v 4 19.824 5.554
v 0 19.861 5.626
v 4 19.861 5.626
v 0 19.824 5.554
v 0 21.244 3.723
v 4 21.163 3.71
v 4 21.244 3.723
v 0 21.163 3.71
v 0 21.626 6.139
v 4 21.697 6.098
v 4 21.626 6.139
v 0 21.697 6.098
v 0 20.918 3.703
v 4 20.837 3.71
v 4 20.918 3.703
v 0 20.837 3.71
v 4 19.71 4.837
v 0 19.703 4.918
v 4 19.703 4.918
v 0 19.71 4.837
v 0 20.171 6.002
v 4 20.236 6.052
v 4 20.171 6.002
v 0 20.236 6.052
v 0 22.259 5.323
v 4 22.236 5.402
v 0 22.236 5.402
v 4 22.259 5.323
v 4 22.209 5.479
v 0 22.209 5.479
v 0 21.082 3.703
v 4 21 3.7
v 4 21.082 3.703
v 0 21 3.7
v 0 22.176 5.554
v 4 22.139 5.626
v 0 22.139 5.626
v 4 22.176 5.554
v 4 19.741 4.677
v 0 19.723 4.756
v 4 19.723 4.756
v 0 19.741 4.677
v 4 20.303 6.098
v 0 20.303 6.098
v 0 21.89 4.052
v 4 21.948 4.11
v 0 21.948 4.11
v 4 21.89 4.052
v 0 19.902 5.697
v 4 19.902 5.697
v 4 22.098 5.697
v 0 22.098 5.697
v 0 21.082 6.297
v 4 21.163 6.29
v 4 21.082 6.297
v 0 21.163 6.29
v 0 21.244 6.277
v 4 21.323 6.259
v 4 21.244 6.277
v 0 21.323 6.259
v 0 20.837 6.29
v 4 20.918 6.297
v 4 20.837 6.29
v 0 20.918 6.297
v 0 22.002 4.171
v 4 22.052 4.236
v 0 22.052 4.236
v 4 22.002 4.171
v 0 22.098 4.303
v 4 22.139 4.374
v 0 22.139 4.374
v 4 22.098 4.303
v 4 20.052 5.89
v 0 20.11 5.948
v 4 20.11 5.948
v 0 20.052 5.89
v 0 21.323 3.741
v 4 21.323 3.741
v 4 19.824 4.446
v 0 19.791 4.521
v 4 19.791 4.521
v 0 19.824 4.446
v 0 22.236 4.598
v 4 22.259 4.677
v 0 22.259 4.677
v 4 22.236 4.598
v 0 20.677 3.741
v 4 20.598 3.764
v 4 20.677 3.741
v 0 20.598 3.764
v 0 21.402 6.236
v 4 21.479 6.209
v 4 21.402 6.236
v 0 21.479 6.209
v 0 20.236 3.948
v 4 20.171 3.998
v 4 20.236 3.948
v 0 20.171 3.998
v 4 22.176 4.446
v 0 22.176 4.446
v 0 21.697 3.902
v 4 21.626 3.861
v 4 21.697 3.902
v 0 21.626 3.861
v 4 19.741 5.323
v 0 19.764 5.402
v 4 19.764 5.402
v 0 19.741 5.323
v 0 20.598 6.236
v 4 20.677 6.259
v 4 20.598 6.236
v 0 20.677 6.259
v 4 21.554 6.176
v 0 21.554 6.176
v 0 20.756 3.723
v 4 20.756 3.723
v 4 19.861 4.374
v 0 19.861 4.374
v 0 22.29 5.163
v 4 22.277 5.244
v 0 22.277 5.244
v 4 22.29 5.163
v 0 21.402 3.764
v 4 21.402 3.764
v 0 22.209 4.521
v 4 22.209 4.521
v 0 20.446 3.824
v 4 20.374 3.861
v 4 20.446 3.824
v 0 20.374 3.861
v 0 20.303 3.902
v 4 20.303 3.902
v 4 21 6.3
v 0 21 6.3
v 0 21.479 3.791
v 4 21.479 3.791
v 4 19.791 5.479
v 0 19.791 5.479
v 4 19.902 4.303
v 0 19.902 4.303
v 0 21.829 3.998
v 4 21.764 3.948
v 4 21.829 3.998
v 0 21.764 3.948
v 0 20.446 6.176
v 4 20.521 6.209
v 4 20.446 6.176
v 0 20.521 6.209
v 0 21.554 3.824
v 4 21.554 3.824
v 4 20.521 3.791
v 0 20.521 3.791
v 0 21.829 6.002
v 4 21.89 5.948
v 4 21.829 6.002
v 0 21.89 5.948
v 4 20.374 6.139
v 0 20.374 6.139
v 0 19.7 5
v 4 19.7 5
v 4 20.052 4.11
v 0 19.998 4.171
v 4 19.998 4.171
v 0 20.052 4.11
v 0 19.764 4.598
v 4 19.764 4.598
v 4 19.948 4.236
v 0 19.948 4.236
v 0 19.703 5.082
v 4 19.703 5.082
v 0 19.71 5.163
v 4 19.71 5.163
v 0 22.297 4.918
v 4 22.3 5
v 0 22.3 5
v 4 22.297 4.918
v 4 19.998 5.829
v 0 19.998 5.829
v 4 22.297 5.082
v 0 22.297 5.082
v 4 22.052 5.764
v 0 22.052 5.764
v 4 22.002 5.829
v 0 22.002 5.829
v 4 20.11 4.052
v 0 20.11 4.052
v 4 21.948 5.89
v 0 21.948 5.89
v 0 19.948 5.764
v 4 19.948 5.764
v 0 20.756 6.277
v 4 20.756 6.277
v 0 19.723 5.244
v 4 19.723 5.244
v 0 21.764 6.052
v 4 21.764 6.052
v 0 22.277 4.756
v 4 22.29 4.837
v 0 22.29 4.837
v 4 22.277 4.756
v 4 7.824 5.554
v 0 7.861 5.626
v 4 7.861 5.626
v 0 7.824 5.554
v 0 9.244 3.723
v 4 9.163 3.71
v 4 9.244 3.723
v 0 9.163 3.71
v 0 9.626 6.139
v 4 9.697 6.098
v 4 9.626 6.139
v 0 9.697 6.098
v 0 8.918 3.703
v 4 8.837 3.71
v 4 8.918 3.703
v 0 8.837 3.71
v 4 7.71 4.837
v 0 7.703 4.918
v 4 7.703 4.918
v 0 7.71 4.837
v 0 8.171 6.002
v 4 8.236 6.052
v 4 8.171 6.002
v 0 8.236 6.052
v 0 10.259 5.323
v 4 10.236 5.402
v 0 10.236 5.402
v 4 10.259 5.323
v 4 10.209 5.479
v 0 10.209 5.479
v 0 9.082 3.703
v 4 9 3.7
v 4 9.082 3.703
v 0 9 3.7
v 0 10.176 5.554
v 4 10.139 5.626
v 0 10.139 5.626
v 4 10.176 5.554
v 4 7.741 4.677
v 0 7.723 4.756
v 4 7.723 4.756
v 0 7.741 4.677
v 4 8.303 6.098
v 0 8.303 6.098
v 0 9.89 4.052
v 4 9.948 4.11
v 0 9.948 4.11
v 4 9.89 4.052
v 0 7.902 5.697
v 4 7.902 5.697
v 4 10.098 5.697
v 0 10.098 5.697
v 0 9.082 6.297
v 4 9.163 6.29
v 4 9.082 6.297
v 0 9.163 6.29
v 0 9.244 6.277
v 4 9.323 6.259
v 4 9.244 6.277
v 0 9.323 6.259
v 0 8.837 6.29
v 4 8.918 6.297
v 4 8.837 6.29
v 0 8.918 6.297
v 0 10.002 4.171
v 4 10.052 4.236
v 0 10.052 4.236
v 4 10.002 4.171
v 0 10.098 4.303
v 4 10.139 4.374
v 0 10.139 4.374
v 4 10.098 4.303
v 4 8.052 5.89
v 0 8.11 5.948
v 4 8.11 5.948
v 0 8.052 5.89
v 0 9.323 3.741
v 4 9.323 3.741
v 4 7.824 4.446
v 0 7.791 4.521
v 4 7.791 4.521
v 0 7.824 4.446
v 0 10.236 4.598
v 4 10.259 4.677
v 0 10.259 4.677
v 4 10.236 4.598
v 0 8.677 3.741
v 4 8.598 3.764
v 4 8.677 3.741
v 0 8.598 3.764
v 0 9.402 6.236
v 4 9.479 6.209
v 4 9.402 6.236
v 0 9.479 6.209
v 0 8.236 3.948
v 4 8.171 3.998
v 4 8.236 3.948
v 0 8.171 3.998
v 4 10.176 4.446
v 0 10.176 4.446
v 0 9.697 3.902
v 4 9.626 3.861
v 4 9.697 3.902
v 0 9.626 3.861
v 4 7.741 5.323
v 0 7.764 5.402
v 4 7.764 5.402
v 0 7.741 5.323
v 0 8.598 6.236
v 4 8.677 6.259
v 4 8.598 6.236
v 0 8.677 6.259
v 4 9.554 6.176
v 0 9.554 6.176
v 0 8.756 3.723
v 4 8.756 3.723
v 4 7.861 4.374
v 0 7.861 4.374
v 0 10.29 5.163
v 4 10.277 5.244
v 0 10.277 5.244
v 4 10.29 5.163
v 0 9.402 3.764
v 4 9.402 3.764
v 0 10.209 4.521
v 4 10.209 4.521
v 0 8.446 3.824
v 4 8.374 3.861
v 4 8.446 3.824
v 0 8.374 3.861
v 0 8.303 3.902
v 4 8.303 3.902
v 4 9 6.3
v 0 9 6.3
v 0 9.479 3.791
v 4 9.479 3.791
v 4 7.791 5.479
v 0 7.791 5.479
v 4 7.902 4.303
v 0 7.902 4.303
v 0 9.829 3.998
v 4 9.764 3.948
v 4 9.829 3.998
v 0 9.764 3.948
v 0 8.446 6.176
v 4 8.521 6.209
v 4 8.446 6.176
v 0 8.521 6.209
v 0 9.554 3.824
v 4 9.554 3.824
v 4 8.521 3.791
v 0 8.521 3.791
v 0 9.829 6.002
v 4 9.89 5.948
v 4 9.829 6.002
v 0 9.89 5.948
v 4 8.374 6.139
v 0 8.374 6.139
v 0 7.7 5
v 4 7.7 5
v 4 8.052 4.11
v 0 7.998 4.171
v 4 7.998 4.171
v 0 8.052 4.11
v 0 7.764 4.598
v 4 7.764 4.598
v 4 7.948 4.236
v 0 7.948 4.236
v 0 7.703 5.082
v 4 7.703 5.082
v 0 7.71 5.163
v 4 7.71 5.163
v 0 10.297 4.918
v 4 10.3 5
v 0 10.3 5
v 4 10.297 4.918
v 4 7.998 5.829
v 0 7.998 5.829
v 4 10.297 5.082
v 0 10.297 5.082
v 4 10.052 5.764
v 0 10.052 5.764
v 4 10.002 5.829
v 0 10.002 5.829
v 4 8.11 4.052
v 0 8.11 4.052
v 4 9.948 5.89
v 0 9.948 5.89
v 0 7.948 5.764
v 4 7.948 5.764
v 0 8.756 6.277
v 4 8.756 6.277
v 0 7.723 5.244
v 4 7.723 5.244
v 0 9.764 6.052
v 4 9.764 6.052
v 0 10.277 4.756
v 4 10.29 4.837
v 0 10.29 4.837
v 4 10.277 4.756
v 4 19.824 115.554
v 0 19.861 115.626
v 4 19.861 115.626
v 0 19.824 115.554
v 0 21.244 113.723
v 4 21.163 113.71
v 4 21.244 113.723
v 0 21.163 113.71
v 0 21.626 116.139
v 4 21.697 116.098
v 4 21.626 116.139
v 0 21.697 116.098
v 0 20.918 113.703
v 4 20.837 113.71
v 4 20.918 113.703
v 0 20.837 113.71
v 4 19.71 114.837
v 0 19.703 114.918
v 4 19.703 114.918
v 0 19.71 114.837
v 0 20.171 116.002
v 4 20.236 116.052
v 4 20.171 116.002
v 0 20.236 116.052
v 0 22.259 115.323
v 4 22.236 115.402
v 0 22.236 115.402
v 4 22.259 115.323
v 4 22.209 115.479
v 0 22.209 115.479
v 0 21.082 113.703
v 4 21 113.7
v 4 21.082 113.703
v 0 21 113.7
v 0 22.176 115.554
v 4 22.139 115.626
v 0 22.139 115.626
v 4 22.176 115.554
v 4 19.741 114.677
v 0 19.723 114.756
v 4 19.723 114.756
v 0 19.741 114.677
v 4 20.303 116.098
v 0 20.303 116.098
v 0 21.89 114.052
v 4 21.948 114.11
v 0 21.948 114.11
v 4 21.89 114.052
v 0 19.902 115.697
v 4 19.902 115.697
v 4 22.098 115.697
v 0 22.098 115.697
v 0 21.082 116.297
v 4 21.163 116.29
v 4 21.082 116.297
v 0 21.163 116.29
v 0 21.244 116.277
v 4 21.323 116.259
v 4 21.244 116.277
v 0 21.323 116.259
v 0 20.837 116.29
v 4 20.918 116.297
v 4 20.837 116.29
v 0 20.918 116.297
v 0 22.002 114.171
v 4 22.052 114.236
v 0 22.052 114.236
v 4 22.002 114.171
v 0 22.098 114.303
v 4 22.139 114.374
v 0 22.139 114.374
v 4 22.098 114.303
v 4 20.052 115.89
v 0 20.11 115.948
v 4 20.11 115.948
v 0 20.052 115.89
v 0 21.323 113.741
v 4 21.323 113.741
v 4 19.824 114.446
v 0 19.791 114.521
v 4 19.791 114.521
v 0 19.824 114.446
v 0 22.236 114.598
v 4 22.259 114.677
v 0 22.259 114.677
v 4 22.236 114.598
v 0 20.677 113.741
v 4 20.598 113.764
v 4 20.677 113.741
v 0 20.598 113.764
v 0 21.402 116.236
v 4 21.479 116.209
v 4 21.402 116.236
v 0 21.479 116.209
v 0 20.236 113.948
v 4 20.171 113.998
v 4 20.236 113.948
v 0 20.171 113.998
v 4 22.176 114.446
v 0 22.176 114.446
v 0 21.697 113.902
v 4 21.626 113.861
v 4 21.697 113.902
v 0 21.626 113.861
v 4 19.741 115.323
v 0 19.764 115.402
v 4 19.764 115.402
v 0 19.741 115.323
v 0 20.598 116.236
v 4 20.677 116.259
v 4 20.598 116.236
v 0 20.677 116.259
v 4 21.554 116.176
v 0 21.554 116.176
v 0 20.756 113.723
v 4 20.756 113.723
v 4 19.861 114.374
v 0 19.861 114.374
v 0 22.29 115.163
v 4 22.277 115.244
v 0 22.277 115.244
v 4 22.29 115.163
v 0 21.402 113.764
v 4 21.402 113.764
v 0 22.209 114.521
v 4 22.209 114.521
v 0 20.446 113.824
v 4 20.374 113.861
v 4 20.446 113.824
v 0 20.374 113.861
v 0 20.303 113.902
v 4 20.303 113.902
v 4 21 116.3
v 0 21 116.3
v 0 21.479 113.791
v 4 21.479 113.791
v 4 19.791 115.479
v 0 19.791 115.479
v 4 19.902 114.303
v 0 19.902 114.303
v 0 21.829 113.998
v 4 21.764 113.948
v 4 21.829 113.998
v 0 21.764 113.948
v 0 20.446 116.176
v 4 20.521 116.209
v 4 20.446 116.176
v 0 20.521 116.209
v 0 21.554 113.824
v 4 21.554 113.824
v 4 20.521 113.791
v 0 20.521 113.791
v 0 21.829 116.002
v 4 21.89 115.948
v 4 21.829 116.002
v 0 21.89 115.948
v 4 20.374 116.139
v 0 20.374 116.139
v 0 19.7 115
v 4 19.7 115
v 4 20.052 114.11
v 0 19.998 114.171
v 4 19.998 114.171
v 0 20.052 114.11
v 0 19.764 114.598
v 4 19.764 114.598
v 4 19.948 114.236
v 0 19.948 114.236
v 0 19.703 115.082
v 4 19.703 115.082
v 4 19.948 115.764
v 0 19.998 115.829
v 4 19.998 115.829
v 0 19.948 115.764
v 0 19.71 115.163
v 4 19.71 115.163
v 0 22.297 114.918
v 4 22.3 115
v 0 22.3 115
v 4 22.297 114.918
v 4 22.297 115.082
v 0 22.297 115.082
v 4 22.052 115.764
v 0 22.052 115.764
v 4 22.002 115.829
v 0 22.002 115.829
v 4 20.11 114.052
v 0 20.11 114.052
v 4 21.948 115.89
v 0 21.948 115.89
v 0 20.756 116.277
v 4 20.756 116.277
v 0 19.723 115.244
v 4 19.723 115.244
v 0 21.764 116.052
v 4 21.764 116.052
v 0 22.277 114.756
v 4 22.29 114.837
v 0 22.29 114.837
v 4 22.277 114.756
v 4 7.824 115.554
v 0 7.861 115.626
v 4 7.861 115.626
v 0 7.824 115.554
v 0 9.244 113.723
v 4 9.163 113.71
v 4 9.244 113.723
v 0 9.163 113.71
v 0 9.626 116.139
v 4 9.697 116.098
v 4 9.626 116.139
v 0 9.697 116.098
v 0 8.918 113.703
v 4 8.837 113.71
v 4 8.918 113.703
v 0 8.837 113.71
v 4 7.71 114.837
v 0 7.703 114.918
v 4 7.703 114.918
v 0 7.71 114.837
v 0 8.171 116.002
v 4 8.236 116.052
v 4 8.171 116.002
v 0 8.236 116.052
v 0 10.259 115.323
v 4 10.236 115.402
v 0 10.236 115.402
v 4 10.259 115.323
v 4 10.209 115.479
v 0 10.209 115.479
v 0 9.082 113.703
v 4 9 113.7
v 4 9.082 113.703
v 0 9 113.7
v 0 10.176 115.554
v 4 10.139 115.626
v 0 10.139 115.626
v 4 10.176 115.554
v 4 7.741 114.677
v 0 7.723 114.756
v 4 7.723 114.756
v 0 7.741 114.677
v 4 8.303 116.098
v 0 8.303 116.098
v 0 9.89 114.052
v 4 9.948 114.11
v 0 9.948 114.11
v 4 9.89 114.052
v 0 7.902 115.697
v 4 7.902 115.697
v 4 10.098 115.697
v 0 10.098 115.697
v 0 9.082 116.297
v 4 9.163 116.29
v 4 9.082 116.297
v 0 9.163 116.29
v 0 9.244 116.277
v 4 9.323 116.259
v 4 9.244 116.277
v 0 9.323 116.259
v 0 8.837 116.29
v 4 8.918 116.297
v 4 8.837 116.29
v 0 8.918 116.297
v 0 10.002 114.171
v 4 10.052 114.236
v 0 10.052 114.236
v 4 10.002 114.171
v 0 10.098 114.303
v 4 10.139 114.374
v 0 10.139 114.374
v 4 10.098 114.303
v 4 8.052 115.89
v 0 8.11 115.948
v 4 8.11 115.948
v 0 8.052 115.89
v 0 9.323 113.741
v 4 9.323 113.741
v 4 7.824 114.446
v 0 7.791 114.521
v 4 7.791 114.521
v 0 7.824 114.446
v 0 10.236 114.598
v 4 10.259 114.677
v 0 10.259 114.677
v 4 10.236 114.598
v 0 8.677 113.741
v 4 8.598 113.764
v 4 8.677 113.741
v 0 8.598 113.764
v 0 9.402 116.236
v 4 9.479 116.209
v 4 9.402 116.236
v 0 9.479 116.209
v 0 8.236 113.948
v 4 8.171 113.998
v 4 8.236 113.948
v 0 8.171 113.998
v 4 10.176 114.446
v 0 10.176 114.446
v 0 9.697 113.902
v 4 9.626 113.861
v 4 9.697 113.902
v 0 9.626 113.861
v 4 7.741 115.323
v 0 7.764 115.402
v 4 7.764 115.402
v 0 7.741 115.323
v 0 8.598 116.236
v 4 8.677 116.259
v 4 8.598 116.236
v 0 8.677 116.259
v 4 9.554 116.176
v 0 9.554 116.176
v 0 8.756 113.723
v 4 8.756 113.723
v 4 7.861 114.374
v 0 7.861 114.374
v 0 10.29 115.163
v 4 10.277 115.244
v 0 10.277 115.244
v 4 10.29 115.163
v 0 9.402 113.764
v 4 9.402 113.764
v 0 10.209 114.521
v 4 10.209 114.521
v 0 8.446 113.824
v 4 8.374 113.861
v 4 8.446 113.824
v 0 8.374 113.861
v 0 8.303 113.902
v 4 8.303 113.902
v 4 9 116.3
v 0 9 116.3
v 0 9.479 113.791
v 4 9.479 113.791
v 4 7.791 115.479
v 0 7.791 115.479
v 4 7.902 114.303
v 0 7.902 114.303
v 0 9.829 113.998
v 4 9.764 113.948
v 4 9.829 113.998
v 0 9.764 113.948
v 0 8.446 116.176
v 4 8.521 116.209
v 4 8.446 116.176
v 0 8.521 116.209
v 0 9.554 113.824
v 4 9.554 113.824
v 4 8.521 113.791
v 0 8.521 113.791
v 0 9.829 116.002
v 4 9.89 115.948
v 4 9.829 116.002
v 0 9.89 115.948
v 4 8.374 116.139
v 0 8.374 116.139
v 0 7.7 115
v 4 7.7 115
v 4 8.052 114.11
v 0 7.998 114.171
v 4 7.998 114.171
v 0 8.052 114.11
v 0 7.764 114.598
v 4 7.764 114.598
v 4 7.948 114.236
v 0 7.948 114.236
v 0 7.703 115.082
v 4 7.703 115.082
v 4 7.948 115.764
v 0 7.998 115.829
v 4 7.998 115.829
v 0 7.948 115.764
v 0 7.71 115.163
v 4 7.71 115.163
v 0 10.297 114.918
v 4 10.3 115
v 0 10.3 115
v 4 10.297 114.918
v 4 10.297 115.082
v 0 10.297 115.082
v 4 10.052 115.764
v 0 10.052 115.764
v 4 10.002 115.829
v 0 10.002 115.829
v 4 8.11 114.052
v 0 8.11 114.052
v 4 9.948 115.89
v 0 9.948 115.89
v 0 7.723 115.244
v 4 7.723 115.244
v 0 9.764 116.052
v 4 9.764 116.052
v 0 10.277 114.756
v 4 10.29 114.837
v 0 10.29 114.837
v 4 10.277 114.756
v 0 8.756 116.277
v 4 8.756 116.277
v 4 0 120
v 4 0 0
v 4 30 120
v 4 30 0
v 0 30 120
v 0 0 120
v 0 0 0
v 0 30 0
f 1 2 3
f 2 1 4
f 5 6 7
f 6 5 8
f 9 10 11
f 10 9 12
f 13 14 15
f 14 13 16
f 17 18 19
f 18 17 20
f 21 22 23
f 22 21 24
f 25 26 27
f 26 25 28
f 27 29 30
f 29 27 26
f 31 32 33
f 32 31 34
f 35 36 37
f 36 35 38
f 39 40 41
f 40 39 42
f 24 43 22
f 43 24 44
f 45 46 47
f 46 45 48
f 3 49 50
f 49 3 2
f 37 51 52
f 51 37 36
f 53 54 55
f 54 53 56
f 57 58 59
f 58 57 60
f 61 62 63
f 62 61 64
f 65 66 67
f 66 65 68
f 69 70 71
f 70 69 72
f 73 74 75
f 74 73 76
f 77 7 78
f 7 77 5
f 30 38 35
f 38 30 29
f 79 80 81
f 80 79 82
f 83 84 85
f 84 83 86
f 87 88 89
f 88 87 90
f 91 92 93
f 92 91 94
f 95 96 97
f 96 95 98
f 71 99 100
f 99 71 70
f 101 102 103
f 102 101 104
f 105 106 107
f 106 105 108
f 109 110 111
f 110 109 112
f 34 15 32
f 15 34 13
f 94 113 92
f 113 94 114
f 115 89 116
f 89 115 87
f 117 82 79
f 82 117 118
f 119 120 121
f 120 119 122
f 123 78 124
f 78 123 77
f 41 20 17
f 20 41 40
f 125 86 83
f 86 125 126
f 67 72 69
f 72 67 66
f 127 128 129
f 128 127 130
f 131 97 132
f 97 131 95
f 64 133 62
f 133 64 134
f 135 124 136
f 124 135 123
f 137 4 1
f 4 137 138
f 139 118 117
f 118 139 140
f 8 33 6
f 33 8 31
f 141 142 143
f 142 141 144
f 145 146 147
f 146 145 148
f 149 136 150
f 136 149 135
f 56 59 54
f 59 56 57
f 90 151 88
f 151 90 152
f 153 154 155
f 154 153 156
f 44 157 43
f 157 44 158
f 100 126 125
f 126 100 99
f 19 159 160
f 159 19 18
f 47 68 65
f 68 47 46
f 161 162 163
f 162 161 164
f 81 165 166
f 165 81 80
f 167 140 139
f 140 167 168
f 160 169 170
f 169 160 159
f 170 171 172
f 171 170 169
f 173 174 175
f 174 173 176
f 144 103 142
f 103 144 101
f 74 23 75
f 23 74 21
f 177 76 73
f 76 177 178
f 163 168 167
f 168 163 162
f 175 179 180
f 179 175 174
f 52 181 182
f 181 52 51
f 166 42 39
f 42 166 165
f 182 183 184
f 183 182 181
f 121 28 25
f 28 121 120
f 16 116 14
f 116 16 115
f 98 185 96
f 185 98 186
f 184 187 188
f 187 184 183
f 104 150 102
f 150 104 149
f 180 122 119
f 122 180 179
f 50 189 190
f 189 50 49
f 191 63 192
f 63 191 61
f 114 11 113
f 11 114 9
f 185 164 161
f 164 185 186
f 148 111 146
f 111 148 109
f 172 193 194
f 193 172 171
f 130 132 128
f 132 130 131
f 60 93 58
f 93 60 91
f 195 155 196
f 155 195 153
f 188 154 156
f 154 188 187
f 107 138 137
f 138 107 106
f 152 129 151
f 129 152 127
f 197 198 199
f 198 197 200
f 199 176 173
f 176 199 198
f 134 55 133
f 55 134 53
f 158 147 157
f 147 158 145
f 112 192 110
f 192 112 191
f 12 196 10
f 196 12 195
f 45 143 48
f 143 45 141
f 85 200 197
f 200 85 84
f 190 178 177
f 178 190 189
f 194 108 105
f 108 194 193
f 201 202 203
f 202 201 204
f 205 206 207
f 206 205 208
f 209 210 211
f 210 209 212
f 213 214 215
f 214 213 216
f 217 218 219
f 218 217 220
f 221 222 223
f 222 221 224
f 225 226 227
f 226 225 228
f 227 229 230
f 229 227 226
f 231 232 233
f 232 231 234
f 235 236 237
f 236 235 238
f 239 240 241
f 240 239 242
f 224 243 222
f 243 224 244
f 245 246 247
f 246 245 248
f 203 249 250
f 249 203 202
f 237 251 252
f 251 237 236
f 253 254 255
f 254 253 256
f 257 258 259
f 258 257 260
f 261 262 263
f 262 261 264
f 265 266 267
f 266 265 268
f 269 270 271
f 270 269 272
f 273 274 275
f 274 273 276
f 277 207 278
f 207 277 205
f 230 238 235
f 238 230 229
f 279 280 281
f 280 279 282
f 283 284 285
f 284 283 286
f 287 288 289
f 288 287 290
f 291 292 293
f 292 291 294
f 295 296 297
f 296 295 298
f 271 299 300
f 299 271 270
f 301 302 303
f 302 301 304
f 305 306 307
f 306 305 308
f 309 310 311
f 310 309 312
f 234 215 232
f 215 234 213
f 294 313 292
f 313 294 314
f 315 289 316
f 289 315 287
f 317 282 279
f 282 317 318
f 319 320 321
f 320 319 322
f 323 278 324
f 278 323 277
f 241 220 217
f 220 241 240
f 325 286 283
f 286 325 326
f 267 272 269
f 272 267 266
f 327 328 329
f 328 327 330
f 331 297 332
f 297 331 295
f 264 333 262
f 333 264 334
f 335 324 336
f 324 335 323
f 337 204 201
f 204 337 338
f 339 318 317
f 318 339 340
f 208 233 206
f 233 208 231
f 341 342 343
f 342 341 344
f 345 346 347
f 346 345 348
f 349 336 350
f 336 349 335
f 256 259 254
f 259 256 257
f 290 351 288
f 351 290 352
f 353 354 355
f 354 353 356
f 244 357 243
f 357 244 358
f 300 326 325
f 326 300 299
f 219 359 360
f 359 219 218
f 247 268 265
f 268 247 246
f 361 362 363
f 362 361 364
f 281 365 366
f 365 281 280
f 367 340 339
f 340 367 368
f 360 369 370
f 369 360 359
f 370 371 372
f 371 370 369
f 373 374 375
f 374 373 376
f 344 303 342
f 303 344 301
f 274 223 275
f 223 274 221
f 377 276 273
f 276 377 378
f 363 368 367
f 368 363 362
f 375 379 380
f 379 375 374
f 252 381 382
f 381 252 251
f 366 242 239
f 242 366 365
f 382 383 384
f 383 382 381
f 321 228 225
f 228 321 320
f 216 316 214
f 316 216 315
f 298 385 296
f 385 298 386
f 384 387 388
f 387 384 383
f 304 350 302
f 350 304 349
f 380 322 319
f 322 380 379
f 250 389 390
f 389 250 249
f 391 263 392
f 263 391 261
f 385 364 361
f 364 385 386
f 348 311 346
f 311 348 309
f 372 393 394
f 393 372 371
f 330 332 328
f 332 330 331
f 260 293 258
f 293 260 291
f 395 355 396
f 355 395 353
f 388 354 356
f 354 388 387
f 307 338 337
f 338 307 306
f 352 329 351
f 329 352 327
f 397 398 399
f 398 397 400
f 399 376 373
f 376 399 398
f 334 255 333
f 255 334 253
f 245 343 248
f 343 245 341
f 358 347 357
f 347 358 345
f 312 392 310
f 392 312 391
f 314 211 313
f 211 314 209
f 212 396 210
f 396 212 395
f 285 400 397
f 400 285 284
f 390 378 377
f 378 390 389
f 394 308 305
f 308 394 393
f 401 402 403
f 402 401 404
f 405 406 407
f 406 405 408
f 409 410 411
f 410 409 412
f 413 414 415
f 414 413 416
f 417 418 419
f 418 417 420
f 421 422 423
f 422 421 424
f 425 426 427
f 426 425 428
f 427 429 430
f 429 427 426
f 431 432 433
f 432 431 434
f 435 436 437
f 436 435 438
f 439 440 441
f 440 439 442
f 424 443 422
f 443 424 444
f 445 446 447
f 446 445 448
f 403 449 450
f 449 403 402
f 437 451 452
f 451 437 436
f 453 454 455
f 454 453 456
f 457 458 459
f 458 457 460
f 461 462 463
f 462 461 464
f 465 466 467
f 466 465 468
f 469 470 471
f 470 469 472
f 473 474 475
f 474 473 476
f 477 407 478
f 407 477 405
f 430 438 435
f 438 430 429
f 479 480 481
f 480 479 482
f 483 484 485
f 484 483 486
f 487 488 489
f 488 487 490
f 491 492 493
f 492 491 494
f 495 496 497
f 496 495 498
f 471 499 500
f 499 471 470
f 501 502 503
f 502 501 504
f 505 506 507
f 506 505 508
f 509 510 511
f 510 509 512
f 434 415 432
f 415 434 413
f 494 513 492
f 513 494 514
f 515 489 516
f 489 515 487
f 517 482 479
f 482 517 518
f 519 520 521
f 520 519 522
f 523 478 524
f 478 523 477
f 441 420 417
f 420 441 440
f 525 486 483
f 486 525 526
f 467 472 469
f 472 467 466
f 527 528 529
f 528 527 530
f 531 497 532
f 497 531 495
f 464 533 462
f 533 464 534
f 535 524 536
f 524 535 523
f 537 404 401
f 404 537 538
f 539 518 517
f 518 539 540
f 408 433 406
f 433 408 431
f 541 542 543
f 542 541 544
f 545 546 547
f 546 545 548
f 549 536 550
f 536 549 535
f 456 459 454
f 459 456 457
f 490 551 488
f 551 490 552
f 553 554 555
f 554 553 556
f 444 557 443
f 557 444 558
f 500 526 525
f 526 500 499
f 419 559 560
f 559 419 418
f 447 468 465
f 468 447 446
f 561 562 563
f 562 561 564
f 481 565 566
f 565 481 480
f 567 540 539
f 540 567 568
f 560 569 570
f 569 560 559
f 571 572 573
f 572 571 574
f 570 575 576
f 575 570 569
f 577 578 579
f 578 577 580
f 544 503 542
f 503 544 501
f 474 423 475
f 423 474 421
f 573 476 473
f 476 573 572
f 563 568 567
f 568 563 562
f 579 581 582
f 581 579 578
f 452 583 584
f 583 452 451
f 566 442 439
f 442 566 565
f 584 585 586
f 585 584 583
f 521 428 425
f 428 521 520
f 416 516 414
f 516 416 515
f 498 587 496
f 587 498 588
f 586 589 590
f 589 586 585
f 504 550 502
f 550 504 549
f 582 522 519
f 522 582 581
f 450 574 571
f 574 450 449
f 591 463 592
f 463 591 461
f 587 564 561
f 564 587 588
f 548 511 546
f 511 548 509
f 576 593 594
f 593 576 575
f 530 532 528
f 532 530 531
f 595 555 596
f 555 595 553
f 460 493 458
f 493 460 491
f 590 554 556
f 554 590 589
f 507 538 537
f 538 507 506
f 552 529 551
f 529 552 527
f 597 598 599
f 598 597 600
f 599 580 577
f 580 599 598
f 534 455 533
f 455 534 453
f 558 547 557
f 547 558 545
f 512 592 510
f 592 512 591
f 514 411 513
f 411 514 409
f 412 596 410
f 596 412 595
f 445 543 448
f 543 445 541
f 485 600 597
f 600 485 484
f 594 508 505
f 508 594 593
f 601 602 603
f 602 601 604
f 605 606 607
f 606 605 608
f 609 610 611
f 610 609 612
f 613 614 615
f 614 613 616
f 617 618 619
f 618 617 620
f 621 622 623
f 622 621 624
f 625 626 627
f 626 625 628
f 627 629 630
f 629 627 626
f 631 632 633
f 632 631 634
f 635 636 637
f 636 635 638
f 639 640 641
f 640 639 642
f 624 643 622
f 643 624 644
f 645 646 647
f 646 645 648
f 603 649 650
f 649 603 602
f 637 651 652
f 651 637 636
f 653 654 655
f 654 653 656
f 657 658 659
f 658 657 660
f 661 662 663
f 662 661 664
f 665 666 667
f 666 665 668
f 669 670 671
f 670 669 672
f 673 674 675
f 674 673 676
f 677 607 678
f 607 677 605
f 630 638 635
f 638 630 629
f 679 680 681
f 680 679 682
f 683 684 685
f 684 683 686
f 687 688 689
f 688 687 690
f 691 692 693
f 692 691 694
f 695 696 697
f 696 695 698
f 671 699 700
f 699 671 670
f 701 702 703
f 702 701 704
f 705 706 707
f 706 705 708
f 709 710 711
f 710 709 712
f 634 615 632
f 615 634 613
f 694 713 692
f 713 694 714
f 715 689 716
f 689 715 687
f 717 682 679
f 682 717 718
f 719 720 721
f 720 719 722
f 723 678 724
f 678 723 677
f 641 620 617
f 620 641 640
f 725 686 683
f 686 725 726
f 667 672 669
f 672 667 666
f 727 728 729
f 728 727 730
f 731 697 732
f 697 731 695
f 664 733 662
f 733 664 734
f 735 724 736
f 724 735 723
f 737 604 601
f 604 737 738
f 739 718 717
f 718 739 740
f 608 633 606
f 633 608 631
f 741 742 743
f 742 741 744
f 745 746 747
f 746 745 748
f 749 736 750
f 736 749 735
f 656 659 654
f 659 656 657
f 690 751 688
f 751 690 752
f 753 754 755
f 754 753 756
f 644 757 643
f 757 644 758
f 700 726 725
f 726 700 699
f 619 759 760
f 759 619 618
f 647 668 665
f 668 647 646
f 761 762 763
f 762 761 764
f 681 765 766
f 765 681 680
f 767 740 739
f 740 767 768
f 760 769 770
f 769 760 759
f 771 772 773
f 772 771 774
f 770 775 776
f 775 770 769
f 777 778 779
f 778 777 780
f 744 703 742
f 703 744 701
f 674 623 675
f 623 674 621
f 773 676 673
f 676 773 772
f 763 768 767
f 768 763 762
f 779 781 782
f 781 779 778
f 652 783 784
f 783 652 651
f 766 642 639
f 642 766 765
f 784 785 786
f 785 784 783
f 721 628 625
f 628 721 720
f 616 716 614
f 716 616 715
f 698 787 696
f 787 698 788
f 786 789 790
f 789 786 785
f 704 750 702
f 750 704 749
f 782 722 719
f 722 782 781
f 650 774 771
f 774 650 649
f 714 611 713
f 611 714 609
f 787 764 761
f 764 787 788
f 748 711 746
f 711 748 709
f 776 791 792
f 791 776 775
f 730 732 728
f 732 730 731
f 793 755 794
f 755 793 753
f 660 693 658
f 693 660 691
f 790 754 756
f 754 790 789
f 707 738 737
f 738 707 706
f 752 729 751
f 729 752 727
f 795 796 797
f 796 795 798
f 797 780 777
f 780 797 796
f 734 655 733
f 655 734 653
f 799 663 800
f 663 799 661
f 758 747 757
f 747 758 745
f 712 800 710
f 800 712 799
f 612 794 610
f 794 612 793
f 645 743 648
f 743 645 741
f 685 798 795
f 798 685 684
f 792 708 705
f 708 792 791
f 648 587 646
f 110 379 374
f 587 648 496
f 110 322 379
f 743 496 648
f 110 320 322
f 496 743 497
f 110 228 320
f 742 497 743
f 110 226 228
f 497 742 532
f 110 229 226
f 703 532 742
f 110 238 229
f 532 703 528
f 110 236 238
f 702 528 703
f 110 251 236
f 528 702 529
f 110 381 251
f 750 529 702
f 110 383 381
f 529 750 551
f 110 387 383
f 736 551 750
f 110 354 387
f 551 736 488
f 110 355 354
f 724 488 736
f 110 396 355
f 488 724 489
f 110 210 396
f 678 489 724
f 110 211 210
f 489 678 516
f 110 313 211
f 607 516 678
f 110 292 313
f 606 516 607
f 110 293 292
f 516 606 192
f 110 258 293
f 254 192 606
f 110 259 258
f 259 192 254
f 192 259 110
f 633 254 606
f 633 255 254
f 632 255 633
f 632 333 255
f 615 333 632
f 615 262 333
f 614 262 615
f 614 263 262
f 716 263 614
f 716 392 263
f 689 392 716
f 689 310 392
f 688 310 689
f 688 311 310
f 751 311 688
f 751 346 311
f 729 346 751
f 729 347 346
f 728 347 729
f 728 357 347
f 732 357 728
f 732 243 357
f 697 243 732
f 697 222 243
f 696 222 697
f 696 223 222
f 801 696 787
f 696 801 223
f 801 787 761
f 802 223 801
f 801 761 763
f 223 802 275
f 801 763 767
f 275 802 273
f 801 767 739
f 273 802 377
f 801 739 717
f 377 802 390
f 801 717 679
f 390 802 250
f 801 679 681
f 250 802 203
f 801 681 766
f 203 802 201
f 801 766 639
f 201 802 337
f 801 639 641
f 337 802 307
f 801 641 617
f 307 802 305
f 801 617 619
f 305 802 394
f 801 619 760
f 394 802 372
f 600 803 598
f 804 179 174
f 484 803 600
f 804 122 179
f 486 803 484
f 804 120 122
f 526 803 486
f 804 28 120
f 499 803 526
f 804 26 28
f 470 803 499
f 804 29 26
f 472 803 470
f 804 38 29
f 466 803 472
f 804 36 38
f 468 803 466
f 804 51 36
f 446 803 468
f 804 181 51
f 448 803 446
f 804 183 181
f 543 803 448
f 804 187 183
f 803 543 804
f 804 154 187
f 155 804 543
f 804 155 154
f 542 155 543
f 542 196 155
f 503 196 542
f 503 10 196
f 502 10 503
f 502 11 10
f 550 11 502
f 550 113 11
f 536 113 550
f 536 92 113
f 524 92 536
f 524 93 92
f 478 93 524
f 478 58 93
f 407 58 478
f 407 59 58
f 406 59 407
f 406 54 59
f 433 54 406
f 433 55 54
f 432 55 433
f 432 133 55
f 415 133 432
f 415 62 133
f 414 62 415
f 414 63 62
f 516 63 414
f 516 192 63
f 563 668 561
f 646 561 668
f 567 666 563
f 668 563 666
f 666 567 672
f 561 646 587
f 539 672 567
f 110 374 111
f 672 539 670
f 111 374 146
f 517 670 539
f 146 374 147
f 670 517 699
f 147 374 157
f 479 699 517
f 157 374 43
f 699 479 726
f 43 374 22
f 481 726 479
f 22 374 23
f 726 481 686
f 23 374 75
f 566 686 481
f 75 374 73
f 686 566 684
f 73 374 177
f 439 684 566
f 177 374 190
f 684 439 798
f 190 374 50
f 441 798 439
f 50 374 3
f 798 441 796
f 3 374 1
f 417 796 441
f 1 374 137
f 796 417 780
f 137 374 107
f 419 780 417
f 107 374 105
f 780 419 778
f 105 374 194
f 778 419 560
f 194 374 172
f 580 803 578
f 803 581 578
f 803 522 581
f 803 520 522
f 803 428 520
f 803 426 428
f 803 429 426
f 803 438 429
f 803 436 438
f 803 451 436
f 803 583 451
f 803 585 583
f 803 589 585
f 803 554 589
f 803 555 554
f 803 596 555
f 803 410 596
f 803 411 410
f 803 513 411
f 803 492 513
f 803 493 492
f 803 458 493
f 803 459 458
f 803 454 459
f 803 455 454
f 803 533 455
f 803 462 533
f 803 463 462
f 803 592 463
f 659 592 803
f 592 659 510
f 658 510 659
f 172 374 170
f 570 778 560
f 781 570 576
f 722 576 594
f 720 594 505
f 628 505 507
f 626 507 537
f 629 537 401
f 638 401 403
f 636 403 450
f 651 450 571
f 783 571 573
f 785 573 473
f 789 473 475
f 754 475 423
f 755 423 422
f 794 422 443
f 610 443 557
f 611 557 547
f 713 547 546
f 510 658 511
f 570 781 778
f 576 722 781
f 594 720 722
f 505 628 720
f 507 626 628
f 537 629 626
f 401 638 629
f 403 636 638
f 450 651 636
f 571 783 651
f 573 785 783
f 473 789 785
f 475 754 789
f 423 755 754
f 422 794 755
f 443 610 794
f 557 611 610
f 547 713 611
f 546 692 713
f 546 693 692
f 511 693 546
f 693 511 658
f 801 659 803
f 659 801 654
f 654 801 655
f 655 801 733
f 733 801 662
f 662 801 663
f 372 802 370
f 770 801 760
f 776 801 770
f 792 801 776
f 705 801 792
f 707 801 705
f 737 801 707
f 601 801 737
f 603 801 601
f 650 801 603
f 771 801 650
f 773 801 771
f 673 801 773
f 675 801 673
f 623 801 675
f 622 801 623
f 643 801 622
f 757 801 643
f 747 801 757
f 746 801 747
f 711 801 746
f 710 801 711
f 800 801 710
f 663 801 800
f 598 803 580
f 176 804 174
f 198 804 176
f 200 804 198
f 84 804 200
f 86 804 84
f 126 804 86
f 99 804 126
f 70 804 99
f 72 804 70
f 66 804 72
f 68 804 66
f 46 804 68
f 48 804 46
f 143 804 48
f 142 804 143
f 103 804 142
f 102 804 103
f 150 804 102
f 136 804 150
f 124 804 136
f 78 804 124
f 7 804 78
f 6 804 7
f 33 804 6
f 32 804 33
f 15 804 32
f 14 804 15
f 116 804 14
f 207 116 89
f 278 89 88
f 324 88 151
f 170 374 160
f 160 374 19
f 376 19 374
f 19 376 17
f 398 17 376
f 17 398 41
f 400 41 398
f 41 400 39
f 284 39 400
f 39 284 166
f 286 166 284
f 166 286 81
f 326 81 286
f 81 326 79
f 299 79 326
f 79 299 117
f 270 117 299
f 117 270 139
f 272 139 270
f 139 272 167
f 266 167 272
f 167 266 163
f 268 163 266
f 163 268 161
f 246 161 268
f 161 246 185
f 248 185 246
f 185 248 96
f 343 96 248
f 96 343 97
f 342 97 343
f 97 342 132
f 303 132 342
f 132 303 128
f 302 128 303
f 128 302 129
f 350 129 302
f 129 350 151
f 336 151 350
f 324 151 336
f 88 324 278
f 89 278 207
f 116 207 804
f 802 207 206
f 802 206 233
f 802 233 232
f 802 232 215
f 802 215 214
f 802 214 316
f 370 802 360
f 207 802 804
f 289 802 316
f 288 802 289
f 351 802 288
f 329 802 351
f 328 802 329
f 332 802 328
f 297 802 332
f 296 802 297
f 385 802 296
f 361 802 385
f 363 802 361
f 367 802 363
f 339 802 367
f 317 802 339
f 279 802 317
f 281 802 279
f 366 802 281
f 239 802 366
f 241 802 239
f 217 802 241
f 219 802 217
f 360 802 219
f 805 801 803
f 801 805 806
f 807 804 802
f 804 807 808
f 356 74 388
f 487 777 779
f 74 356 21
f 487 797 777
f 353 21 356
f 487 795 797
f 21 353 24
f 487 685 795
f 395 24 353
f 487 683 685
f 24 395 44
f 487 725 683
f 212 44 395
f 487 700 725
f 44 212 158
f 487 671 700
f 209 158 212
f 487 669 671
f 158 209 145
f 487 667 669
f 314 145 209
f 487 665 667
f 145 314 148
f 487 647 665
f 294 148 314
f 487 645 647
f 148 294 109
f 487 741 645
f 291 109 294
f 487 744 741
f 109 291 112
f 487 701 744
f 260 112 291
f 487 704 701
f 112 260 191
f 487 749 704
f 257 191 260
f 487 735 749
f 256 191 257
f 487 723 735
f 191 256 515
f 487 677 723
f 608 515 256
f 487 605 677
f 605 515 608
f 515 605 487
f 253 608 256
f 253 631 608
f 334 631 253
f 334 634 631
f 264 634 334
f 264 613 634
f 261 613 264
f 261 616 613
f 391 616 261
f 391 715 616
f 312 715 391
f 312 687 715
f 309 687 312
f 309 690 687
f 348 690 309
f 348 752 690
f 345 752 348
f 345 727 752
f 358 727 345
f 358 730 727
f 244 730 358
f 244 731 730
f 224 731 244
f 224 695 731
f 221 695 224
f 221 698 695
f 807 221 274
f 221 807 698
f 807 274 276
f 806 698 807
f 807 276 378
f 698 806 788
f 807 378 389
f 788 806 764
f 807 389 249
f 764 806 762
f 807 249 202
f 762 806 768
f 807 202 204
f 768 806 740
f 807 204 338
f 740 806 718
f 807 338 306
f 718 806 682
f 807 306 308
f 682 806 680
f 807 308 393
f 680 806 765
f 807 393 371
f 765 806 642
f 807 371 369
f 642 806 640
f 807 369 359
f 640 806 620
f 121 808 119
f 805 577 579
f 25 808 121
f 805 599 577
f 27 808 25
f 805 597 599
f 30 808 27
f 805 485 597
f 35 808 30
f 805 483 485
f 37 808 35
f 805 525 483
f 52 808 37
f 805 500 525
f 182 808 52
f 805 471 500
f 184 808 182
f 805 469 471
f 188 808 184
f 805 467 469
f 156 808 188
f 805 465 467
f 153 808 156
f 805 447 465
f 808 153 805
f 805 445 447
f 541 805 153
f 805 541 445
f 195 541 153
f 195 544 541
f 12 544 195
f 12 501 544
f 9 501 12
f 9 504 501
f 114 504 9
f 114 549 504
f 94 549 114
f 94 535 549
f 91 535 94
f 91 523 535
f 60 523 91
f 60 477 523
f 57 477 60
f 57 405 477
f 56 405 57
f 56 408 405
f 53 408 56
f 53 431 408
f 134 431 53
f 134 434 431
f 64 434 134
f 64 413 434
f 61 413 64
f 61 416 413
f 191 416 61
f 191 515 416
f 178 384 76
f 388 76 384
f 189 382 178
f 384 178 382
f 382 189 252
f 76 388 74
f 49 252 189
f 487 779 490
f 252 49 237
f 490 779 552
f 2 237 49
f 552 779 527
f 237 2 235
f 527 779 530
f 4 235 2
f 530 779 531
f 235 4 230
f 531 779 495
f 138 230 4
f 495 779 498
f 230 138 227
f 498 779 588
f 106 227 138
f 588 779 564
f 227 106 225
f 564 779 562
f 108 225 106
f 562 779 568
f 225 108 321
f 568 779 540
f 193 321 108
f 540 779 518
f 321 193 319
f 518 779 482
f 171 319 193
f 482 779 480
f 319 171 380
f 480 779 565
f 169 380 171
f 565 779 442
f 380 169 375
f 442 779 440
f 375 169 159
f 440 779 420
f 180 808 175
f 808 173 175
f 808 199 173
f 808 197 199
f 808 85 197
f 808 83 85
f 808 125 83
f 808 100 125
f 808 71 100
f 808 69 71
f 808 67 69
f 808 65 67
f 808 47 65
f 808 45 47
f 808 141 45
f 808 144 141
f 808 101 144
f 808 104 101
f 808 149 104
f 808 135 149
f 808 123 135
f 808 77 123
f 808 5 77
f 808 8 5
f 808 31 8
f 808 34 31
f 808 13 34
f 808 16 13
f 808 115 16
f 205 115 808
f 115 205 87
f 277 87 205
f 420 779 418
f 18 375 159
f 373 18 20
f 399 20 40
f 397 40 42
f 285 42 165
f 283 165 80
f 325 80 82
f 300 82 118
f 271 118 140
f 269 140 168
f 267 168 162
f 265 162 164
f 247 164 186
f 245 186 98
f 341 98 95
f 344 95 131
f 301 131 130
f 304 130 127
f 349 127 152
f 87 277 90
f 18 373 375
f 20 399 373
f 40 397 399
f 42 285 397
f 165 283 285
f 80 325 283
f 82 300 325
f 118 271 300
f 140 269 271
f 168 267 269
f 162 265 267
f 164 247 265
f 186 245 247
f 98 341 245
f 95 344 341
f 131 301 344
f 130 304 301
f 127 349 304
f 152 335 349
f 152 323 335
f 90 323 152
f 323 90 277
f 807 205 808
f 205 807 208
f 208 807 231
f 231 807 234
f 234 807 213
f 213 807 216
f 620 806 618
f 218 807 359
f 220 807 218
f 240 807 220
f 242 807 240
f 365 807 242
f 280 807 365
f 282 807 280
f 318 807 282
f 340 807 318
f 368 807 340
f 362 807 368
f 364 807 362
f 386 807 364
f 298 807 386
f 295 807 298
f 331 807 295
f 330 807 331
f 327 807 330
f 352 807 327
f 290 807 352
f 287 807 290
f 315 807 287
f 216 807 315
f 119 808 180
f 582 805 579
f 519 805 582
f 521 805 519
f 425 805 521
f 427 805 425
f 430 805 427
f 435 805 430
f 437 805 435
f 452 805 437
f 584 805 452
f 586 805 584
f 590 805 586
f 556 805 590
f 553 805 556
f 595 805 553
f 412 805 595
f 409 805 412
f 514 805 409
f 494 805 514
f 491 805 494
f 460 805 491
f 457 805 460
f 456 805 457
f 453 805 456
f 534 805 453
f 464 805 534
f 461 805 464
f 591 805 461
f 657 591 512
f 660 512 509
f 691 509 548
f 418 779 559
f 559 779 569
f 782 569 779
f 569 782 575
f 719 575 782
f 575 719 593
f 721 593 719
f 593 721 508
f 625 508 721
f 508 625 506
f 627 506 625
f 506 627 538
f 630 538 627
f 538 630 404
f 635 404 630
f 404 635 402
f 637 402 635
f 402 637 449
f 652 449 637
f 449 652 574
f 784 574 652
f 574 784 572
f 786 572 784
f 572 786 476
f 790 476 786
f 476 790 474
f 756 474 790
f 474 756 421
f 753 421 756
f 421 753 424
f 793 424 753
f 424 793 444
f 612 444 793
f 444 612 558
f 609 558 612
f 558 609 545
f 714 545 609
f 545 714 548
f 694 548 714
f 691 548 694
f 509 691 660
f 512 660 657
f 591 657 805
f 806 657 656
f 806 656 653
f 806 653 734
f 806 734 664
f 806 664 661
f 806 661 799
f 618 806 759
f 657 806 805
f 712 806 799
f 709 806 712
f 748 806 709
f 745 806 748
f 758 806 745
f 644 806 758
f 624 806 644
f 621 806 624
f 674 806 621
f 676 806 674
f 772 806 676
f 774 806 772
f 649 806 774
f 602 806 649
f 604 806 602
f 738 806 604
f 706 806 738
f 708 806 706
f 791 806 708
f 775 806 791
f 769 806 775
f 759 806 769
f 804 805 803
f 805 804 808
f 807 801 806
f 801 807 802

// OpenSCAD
difference(){
	union(){
        
       translate([0,0,0]){
           cube([4,30,120], center=false);
       }


	}
	union() {

       translate([-10,15+6,5]){
            rotate(a = [0,90,0]) {
              cylinder(h=600, r=1.3, $fn=100, center=false);
            }
       }	
       translate([-10,15-6,5]){
            rotate(a = [0,90,0]) {
              cylinder(h=600, r=1.3, $fn=100, center=false);
            }
       }	


       translate([-10,15+6,120-5]){
            rotate(a = [0,90,0]) {
              cylinder(h=600, r=1.3, $fn=100, center=false);
            }
       }	
       translate([-10,15-6,120-5]){
            rotate(a = [0,90,0]) {
              cylinder(h=600, r=1.3, $fn=100, center=false);
            }
       }	


        
	}
}
